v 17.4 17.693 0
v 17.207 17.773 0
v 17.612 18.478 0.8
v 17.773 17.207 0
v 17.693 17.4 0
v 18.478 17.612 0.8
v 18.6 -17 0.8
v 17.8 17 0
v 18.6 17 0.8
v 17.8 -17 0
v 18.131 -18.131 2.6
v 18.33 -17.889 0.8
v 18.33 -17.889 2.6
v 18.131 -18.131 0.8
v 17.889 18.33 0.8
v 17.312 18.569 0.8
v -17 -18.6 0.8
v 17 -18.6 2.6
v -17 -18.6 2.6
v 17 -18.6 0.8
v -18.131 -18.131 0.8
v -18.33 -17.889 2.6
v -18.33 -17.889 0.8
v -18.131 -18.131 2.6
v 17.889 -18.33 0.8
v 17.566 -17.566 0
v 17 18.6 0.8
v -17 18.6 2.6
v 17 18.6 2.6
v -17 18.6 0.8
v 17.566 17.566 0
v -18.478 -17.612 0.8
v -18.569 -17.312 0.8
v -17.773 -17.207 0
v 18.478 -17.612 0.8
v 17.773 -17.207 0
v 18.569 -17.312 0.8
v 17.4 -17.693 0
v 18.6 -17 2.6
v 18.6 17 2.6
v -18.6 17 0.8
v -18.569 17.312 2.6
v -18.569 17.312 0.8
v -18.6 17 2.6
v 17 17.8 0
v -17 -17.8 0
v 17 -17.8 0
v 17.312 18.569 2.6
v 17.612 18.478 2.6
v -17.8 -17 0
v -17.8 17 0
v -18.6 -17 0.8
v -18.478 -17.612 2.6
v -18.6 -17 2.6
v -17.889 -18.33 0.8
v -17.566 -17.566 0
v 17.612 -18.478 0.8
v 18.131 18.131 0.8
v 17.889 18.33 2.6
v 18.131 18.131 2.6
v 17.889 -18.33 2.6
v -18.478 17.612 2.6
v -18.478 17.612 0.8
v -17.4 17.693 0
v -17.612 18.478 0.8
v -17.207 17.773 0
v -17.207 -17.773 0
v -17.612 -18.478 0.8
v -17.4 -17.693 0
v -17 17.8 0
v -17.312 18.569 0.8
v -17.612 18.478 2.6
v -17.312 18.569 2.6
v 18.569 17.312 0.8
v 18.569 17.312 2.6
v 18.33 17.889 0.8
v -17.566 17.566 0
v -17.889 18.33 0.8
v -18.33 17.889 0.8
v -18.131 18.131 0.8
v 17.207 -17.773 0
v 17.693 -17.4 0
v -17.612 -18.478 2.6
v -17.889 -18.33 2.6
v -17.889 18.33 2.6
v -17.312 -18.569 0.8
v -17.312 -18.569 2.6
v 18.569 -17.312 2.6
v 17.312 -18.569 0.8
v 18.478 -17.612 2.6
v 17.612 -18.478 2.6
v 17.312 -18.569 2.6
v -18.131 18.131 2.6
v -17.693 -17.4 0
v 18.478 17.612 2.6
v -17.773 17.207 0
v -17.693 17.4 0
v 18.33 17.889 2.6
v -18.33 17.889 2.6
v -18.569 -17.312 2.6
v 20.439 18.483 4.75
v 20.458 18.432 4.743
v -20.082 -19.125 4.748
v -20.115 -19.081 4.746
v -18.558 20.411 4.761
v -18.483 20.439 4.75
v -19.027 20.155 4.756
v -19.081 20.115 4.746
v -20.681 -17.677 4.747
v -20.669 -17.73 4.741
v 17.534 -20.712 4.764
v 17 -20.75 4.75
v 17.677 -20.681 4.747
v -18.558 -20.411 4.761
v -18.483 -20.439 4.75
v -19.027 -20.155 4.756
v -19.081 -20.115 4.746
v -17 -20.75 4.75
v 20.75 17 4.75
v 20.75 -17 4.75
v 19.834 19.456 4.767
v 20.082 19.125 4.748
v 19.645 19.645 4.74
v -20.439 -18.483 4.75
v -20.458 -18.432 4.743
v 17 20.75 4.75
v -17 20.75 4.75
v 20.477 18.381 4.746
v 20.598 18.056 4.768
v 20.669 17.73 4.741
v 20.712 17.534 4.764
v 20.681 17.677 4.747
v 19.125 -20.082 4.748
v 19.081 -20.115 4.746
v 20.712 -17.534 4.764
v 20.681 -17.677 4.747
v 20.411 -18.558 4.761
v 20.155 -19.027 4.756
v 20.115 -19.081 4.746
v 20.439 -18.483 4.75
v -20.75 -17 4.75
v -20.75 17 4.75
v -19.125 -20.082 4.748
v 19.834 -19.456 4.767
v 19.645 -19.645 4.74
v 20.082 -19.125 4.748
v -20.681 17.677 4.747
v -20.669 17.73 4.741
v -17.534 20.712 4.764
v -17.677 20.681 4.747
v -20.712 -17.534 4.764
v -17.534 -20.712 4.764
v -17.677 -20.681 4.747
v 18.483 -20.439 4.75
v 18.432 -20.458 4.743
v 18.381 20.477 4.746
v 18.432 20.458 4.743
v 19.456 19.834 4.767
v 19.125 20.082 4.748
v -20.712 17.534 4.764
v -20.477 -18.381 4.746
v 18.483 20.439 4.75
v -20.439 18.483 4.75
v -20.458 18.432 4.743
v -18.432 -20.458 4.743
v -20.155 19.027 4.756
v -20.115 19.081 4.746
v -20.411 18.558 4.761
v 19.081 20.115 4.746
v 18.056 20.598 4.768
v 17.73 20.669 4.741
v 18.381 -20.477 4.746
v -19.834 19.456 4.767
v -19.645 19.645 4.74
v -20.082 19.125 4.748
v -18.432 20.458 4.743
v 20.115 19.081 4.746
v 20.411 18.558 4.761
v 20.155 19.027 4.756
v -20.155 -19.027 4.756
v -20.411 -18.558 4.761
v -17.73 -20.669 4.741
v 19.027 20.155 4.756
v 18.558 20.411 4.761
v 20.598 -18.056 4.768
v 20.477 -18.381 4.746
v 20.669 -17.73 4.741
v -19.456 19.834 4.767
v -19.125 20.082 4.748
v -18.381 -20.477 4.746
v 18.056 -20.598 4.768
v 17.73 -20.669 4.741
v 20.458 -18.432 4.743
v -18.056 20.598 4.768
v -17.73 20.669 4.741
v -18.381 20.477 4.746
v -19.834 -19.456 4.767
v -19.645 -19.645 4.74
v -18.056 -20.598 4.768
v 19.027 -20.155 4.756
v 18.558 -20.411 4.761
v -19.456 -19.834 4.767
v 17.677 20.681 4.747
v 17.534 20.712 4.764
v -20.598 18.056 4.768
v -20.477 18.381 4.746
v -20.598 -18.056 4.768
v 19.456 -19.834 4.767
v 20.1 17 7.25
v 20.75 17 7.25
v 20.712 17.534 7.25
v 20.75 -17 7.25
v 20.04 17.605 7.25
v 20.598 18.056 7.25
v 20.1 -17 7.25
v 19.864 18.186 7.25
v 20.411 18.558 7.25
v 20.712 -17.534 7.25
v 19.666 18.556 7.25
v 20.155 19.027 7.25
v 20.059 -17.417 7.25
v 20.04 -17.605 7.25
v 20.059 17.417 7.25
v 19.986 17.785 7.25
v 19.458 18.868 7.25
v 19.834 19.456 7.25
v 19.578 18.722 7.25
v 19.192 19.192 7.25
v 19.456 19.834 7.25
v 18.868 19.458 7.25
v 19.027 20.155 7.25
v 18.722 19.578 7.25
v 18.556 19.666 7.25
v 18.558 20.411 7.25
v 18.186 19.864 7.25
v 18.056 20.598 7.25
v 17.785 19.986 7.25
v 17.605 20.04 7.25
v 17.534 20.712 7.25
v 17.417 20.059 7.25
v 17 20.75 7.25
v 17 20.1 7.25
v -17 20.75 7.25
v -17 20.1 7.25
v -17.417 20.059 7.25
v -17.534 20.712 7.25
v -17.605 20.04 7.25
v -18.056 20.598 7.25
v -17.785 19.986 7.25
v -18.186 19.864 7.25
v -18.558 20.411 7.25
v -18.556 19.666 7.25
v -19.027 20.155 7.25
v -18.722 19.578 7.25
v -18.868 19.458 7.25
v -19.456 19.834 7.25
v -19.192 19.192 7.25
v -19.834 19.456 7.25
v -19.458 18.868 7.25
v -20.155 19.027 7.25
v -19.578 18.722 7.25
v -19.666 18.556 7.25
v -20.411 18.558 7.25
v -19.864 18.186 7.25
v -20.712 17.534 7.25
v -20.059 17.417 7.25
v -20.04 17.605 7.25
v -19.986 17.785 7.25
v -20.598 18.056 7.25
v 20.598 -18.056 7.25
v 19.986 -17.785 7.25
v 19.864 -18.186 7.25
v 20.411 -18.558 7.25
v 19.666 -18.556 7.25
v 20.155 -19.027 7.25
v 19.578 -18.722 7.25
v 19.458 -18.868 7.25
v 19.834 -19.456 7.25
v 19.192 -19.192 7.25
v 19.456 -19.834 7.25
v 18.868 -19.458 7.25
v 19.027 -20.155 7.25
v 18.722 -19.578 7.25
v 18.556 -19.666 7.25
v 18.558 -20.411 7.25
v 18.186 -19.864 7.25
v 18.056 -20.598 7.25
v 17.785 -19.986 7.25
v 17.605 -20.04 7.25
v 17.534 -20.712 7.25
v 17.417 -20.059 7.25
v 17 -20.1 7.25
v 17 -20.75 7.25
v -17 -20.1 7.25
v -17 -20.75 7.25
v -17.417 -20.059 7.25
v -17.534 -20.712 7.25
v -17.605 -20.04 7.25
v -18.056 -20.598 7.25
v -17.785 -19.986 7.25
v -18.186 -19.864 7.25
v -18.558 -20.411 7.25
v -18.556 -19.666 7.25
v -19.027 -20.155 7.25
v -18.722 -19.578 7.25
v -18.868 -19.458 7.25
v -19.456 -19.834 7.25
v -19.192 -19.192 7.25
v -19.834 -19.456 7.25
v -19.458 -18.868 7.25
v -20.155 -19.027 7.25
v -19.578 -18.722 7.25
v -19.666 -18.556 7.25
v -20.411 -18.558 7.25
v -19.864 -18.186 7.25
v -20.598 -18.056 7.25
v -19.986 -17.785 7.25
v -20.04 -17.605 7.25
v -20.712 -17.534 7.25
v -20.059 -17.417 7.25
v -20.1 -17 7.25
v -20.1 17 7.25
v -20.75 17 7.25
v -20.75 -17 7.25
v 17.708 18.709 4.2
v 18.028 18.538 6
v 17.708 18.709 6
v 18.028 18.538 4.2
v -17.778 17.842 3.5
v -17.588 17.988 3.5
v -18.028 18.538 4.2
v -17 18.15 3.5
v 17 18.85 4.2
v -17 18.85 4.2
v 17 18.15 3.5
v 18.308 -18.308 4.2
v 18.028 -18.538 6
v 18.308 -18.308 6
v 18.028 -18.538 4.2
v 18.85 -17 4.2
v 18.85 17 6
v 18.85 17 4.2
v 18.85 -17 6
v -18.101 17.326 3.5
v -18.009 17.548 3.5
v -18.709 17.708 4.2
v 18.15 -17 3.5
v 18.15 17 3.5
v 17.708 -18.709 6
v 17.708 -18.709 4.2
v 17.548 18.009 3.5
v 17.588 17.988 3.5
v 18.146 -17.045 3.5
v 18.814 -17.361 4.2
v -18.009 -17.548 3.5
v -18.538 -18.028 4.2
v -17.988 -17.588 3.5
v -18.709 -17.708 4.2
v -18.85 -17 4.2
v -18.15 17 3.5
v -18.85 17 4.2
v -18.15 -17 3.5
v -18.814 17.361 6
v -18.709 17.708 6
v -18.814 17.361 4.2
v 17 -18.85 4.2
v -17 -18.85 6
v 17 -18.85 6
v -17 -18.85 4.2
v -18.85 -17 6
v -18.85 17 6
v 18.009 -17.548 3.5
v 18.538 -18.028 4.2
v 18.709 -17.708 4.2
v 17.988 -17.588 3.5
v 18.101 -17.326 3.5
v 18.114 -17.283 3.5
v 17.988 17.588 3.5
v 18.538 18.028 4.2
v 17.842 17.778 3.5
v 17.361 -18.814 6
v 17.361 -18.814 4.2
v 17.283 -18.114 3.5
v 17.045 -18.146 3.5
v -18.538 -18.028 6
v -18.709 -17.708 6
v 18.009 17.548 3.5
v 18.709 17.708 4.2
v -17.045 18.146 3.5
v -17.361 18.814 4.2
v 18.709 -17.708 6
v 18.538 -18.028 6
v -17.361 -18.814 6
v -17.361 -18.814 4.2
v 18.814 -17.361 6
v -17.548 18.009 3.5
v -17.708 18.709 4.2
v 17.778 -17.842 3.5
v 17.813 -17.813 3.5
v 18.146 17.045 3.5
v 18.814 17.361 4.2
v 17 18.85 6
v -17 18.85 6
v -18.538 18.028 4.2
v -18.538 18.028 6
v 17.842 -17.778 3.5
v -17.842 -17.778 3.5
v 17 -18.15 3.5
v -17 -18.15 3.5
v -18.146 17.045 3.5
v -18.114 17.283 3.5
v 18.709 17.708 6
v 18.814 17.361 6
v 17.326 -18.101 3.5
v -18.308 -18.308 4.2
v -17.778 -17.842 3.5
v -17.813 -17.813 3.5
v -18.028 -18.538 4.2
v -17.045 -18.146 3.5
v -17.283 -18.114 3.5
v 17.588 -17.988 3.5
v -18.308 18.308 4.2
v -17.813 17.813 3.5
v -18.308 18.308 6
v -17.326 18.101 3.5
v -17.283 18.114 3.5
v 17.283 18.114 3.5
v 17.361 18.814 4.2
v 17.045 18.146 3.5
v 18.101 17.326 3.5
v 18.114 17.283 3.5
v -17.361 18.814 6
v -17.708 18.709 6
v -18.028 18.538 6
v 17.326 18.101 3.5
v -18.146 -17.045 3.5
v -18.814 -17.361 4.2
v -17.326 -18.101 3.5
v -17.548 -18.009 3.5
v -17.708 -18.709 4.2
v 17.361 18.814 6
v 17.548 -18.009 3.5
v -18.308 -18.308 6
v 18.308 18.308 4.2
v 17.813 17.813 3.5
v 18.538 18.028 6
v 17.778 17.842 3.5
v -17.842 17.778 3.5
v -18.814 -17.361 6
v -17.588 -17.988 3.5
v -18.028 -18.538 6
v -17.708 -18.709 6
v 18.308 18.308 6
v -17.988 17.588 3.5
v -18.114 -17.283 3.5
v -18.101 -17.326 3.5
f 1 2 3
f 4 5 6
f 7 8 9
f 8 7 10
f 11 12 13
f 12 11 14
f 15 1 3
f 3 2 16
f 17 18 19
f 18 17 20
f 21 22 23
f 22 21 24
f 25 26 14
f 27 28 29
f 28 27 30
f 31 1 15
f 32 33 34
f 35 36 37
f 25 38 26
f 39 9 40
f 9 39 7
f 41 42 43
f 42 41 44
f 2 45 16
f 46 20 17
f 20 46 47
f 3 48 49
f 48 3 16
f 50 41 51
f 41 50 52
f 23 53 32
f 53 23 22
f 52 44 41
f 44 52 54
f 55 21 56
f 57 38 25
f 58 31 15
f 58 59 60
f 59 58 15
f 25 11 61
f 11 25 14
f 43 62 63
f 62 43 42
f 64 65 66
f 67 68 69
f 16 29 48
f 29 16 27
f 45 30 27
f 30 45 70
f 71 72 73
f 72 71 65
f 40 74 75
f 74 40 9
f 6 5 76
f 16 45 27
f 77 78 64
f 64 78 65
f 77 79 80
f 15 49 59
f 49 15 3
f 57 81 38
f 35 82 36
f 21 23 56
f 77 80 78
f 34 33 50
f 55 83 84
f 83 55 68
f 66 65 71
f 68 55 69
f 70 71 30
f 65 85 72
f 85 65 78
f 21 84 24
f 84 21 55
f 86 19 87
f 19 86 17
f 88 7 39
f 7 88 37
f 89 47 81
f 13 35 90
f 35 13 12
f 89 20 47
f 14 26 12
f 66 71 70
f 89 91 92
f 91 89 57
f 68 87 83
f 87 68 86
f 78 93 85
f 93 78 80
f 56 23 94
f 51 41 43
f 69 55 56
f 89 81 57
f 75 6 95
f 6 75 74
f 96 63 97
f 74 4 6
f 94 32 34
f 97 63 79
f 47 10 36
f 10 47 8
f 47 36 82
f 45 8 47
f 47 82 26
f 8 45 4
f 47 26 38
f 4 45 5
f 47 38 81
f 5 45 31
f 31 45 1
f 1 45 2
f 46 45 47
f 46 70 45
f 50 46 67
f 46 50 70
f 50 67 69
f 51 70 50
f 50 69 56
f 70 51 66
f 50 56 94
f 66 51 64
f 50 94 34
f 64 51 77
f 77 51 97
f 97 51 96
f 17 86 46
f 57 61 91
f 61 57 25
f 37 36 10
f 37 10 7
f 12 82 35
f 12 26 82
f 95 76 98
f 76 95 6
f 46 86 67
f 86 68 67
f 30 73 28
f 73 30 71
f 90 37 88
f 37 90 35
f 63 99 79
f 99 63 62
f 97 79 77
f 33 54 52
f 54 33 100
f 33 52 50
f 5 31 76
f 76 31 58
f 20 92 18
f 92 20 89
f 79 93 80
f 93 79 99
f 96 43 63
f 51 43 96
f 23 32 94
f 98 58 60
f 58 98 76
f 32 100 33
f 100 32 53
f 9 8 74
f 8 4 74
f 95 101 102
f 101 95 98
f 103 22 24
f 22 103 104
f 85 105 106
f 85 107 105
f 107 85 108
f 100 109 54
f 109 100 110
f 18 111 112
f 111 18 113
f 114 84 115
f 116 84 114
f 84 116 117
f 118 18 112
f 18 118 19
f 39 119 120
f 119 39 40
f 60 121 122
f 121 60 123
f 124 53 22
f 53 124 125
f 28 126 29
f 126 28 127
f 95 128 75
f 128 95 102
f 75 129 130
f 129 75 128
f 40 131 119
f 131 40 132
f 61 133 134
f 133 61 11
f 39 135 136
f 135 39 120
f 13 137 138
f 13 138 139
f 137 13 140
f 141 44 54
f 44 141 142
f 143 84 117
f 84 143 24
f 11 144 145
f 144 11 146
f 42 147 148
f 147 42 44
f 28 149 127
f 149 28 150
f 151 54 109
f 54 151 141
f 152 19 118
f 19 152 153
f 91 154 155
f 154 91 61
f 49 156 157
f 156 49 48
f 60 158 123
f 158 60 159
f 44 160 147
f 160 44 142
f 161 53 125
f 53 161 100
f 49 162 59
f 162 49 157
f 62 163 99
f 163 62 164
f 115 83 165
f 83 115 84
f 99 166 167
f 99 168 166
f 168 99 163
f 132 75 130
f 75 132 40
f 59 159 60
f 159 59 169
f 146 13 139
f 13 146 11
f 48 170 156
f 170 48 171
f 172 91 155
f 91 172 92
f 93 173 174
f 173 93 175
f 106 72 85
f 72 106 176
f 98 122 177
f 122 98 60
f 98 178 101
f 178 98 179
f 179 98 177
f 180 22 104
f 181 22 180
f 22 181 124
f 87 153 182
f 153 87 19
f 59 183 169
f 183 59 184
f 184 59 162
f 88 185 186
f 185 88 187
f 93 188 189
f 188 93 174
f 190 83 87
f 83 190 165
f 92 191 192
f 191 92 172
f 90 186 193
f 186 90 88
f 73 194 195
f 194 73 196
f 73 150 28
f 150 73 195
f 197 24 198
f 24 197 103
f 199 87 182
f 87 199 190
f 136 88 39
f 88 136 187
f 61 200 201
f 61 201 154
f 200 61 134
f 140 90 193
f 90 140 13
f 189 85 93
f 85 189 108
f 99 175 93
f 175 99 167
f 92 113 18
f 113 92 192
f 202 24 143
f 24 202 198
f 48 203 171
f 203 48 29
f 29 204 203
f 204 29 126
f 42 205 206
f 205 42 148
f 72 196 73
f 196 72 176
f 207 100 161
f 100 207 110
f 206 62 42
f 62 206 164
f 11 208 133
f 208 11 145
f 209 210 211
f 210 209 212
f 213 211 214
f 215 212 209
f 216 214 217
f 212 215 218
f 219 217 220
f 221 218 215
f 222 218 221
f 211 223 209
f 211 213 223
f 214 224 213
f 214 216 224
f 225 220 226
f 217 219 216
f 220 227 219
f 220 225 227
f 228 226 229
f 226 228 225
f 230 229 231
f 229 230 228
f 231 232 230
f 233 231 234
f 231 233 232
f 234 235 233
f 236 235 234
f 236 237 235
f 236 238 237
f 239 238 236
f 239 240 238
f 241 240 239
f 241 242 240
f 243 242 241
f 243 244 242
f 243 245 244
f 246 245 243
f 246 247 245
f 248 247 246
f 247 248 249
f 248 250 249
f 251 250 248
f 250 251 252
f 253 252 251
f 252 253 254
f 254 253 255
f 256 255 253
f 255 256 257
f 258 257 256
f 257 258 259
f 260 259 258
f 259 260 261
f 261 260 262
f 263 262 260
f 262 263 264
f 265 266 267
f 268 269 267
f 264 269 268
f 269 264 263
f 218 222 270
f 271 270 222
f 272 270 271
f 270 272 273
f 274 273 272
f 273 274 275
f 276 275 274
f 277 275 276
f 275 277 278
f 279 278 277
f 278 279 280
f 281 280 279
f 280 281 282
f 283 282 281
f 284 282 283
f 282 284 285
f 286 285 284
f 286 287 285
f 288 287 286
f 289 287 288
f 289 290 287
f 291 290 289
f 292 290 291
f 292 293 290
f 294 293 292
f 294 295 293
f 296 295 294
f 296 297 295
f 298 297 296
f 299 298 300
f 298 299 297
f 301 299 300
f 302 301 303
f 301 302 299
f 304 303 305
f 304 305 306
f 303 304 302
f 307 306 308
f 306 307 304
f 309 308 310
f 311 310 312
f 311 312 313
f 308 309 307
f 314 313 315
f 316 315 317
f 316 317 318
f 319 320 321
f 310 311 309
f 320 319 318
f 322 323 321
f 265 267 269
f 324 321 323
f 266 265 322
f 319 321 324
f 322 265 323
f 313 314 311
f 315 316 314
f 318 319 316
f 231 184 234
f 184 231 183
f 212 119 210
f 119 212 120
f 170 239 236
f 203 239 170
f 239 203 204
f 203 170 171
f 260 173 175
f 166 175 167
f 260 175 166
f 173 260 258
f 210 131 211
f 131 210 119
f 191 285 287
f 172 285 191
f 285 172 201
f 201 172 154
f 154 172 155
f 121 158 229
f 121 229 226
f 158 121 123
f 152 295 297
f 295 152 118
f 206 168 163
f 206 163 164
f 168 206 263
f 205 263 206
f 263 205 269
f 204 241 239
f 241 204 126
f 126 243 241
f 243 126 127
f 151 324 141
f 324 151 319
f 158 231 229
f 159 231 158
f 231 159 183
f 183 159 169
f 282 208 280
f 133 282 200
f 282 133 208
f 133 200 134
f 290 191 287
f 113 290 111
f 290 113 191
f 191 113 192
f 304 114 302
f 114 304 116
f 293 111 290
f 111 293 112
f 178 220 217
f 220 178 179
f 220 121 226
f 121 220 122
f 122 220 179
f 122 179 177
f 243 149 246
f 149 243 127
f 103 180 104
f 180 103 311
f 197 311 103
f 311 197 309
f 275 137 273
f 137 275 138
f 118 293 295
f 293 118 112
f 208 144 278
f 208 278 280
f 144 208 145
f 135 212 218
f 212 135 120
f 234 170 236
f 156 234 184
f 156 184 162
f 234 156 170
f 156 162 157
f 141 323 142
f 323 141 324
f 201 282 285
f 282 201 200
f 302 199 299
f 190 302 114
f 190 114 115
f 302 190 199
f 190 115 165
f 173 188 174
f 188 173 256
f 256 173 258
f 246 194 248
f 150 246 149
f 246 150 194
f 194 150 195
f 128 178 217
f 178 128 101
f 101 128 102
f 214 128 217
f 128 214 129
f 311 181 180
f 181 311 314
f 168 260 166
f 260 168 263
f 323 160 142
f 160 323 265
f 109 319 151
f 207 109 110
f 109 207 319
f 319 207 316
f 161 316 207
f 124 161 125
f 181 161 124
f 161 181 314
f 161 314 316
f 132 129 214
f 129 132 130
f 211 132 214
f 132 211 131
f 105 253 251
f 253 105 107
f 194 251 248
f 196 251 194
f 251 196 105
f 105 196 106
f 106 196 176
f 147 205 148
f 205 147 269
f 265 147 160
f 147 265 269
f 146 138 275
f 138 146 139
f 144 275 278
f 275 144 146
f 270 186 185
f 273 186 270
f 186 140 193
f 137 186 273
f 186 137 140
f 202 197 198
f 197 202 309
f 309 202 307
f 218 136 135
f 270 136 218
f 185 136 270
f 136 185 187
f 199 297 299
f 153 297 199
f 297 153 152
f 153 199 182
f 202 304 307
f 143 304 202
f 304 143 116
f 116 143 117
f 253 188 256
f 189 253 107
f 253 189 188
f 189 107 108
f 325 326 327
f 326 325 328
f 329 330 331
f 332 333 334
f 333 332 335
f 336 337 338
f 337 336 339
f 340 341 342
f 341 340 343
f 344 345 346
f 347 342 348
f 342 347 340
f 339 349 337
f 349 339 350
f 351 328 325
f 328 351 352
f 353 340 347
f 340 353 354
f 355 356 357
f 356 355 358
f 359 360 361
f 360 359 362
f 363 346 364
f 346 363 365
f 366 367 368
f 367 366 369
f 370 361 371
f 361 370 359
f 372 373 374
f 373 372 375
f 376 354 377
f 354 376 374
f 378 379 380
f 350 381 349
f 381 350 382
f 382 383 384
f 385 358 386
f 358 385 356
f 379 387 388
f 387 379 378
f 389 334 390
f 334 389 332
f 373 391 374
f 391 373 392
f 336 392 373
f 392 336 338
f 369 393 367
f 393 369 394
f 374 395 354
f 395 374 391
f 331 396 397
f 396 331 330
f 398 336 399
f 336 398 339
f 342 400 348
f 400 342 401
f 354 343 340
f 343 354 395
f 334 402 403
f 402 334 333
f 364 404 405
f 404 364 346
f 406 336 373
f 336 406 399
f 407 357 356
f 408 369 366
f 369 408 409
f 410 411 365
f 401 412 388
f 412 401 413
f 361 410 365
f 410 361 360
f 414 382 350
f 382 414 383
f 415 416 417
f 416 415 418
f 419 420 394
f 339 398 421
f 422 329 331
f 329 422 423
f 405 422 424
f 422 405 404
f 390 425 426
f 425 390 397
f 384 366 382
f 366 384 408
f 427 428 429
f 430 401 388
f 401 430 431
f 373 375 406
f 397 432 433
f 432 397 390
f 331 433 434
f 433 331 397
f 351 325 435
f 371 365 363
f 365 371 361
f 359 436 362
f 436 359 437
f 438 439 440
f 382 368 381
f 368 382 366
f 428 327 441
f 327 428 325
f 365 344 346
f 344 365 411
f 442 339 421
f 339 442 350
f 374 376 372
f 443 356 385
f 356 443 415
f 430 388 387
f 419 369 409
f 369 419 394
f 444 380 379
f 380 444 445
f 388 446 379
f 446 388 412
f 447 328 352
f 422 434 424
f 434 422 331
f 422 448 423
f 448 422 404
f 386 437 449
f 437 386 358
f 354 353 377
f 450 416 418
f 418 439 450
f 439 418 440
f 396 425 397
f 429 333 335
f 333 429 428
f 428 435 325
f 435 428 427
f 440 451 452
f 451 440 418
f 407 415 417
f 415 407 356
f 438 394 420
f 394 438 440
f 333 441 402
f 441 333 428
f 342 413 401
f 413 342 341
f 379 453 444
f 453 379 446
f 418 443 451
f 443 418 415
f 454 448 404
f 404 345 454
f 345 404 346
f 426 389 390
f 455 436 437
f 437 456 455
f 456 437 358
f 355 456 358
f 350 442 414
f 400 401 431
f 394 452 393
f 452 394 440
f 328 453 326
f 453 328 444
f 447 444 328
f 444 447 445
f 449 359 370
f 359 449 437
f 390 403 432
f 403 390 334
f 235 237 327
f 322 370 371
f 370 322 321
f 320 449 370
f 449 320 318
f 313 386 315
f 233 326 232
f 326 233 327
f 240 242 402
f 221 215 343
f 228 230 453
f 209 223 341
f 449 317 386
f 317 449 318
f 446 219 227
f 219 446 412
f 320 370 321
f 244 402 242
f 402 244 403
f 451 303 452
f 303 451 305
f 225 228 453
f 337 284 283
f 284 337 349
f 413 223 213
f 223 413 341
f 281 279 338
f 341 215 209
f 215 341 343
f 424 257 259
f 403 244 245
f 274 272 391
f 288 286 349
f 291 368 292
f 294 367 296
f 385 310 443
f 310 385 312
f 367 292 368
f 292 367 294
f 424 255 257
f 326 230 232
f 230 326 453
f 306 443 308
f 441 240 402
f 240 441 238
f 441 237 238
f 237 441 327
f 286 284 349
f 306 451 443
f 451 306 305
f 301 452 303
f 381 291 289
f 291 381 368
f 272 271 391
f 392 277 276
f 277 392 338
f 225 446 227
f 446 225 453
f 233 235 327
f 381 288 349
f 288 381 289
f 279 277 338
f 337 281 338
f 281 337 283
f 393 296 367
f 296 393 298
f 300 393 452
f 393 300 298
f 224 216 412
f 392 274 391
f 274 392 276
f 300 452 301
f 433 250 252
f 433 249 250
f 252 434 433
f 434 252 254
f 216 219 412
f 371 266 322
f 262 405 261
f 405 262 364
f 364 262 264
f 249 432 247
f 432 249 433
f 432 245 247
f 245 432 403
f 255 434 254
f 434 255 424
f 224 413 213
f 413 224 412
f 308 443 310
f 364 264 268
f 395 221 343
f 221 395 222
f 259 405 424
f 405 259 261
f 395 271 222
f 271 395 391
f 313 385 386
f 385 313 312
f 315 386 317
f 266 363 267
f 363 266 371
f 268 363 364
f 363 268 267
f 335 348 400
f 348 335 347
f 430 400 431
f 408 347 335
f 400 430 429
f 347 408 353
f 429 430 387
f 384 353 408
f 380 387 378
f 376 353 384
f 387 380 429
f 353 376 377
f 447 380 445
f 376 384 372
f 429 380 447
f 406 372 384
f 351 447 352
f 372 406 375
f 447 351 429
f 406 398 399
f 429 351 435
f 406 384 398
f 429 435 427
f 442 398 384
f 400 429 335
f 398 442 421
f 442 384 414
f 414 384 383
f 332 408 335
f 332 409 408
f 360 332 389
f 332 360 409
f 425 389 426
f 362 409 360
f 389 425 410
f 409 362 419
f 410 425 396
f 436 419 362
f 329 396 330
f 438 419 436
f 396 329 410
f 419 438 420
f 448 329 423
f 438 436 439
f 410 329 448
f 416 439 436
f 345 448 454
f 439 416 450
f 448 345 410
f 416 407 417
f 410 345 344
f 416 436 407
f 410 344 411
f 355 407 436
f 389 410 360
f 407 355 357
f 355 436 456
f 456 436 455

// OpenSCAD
// file: modules/gridfinity_modules.scad
gridfinity_pitch = 42;
gridfinity_zpitch = 7;
gridfinity_clearance = 0.5;  // each bin is undersize by this much

// basic block with cutout in top to be stackable, optional holes in bottom
// start with this and begin 'carving'
module grid_block(num_x=1, num_y=1, num_z=2, magnet_diameter=6.5, screw_depth=6, center=false, hole_overhang_remedy=false) {
  corner_radius = 3.75;
  outer_size = gridfinity_pitch - gridfinity_clearance;  // typically 41.5
  block_corner_position = outer_size/2 - corner_radius;  // need not match center of pad corners
  magnet_thickness = 2.4;
  magnet_position = magnet_diameter > 8 ? 17 - magnet_diameter / 2 : 13;
  screw_hole_diam = 3;
  
  overhang_fix = hole_overhang_remedy && magnet_diameter > 0 && screw_depth > 0;
  overhang_fix_depth = 0.3;  // assume this is enough
  
  totalht=gridfinity_zpitch*num_z+3.75;
  translate( center ? [-(num_x-1)*gridfinity_pitch/2, -(num_y-1)*gridfinity_pitch/2, 0] : [0, 0, 0] )
  difference() {
    intersection() {
      union() {
        // grid of pads
        gridcopy(num_x, num_y) pad_oversize();
        // main body will be cut down afterward
        translate([-gridfinity_pitch/2, -gridfinity_pitch/2, 5]) 
        cube([gridfinity_pitch*num_x, gridfinity_pitch*num_y, totalht-5]);
      }
      
      // crop with outer cylinders
      translate([0, 0, -0.1])
      hull() 
      cornercopy(block_corner_position, num_x, num_y) 
      cylinder(r=corner_radius, h=totalht+0.2, $fn=44);
    }
    
    // remove top so XxY can fit on top
      color("blue") 
      translate([0, 0, gridfinity_zpitch*num_z]) 
      pad_oversize(num_x, num_y, 1);
    
    if (screw_depth > 0) {  // add pockets for screws if requested
      gridcopy(num_x, num_y) cornercopy(magnet_position)
      translate([0, 0, -0.1]) cylinder(d=screw_hole_diam, h=screw_depth+0.1, $fn=28);
    }
    
    if (magnet_diameter > 0) {  // add pockets for magnets if requested
      gridcopy(num_x, num_y) cornercopy(magnet_position)
      translate([0, 0, -0.1]) cylinder(d=magnet_diameter, h=magnet_thickness+0.1, $fn=41);
    }
    
    if (overhang_fix) {  // people seem to really like this overhang fix
      gridcopy(num_x, num_y) cornercopy(magnet_position)
      translate([0, 0, magnet_thickness-0.1]) 
      render() intersection() {  // for some reason OpenSCAD blows up if I don't render here
        translate([-magnet_diameter/2, -screw_hole_diam/2, 0]) cube([magnet_diameter, screw_hole_diam, overhang_fix_depth+0.1]);
        cylinder(d=magnet_diameter, h=1, $fn=41);
      }
    }
  }
}


// unit pad slightly oversize at the top to be trimmed or joined with other feet or the rest of the model
// also useful as cutouts for stacking
module pad_oversize(num_x=1, num_y=1, margins=0) {
  pad_corner_position = 17; // must be 17 to be compatible
  bevel1_top = 0.8;     // z of top of bottom-most bevel (bottom of bevel is at z=0)
  bevel2_bottom = 2.6;  // z of bottom of second bevel
  bevel2_top = 5;       // z of top of second bevel
  bonus_ht = 0.2;       // extra height (and radius) on second bevel
  
  // female parts are a bit oversize for a nicer fit
  radialgap = margins ? 0.25 : 0;  // oversize cylinders for a bit of clearance
  axialdown = margins ? 0.1 : 0;   // a tiny bit of axial clearance present in Zack's design
  
  translate([0, 0, -axialdown])
  difference() {
    union() {
      hull() cornercopy(pad_corner_position, num_x, num_y) {
        cylinder(d=1.6+2*radialgap, h=0.1, $fn=24);
        translate([0, 0, bevel1_top]) cylinder(d=3.2+2*radialgap, h=1.9, $fn=32);
      }
      
      hull() cornercopy(pad_corner_position, num_x, num_y) {
        translate([0, 0, bevel2_bottom]) 
        cylinder(d1=3.2+2*radialgap, d2=7.5+0.5+2*radialgap+2*bonus_ht, h=bevel2_top-bevel2_bottom+bonus_ht, $fn=32);
      }
    }
    
    // cut off bottom if we're going to go negative
    if (margins) {
      translate([-gridfinity_pitch/2, -gridfinity_pitch/2, 0])
      cube([gridfinity_pitch*num_x, gridfinity_pitch*num_y, axialdown]);
    }
  }
}


// similar to quadtranslate but expands to extremities of a block
module cornercopy(r, num_x=1, num_y=1) {
  for (xx=[-r, gridfinity_pitch*(num_x-1)+r]) for (yy=[-r, gridfinity_pitch*(num_y-1)+r]) 
    translate([xx, yy, 0]) children();
}


// make repeated copies of something(s) at the gridfinity spacing of 42mm
module gridcopy(num_x, num_y) {
  for (xi=[1:num_x]) for (yi=[1:num_y]) translate([gridfinity_pitch*(xi-1), gridfinity_pitch*(yi-1), 0]) children();
}
// main file
include <modules/gridfinity_modules.scad>

// Select model
part = "tile";  // [ board, tile, pawn, knight, bishop, rook, queen, king ]

if (part == "tile") {
  tile();
}
else if (part == "pawn") {
  pawn();
}
else if (part == "knight") {
  knight();
}
else if (part == "bishop") {
  bishop();
}
else if (part == "rook") {
  rook();
}
else if (part == "queen") {
  queen();
}
else if (part == "king") {
  king();
}
else if (part == "board") {
  board();
  color("#DDDDDD") piece_set();
  color("#505050") piece_set(false);
}


module piece_set(white=true) {
  pawnrow = white ? 1 : 6;
  restrow = white ? 0 : 7;
  
  for (i=[0:7]) {
    translate([i*42, 42*pawnrow, 0]) pawn();
  }
  for (i=[0,1]) {
    translate([0 + 7*i*42, restrow*42, 0]) rook();
    translate([(1 + 5*i)*42, restrow*42, 0]) 
      rotate([0, 0, white ? 0 : 180]) knight();
    translate([(2 + 3*i)*42, restrow*42, 0]) bishop();
  }
  translate([3*42, restrow*42, 0]) queen();
  translate([4*42, restrow*42, 0]) king();
}


module king() {
  base();
  
  rotate_extrude($fn=60)
  polygon([[0, 47], [0, 0], [11, 0], [11, 10], [8, 13], [6, 38],
    [9, 42], [9, 45], [7, 46]]);
  
  translate([-1.5, -1, 47-1]) cube([3, 2, 10]);
  translate([-3, -1, 51]) cube([6, 2, 3]);
}


module queen() {
  base();
  
  difference() {  
    rotate_extrude($fn=60)
    polygon([[0, 45], [0, 0], [11, 0], [11, 10], [8, 13], [6, 42], 
      [8, 44], [8, 46], [10, 48], [10, 53], [8, 53], [6, 48]]);
    
    for (a=[0, 60, 120]) rotate([0, 0, a])
    translate([-15, -1.5, 48.5]) cube([30, 3, 10]);
  }
}


module knight() {
  base();

  rotate_extrude($fn=60)
  polygon([[0, 13], [0, 0], [9, 0], [9, 10], [7, 13]]);
  
  hull() {
    translate([-4, -7.5, 0]) cube([8, 13, 14]);
    translate([-2.5, -7.5, 30]) cube([5, 8, 3]);
  }
  translate([-2.5-.125, -7.5, 30]) cube([5+.25, 17, 7]);
  
}


module bishop() {
  base();
  
  tz(42) sphere(d=3, $fn=60);
  
  difference() {
    rotate_extrude($fn=60)
    polygon([[0, 42], [0, 0], [9, 0], [9, 10], [7, 13], [3.5, 26], [6, 32]]);
    
    translate([4.5, 0, 40])
    rotate([0, -56, 0])
    cylinder(d=20, h=1, $fn=60);
  }
}


module rook() {
  base();
  
  difference() {
    rotate_extrude($fn=60)
    polygon([[0, 34], [0, 0], [10, 0], [10, 10], [7, 13], [7, 29], 
      [10, 32], [10, 39], [8, 39], [8, 34]]);
    
    for (a=[0, 90]) rotate([0, 0, a]) 
      translate([-15, -1.5, 34.5]) cube([30, 3, 10]);
  }
}


module pawn() {
  base();
  
  tz(25) sphere(d=11, $fn=60);
  
  rotate_extrude($fn=60)
  polygon([[0, 25], [0, 0], [7, 0], [7, 8], [4.5, 11], [3, 24]]);
}


module base() {
  difference() {
    grid_block(1, 1, 0.72, magnet_diameter=0, screw_depth=0);
    difference() {
      cube([35, 35, 30], center=true);
      for (a=[45, 135]) rotate([0, 0, a]) cube([60, 2, 30], center=true);
    }
    
    translate([-21, -21, 5]) cube([42, 42, 42]);
  }
}


module board() {  // 64 tiles in alternating colors
  tz(-3.55) for (ti=[0:7]) for (tj=[0:7]) translate([42*ti, 42*tj, 0]) 
    color((ti+tj)%2 == 0 ? "darkblue" : "lightblue")
    render() tile();
}


module tile() {
  grid_block(1, 1, 0.5, magnet_diameter=0, screw_depth=0);
}


module tz(z) {
  translate([0, 0, z]) children();
}
